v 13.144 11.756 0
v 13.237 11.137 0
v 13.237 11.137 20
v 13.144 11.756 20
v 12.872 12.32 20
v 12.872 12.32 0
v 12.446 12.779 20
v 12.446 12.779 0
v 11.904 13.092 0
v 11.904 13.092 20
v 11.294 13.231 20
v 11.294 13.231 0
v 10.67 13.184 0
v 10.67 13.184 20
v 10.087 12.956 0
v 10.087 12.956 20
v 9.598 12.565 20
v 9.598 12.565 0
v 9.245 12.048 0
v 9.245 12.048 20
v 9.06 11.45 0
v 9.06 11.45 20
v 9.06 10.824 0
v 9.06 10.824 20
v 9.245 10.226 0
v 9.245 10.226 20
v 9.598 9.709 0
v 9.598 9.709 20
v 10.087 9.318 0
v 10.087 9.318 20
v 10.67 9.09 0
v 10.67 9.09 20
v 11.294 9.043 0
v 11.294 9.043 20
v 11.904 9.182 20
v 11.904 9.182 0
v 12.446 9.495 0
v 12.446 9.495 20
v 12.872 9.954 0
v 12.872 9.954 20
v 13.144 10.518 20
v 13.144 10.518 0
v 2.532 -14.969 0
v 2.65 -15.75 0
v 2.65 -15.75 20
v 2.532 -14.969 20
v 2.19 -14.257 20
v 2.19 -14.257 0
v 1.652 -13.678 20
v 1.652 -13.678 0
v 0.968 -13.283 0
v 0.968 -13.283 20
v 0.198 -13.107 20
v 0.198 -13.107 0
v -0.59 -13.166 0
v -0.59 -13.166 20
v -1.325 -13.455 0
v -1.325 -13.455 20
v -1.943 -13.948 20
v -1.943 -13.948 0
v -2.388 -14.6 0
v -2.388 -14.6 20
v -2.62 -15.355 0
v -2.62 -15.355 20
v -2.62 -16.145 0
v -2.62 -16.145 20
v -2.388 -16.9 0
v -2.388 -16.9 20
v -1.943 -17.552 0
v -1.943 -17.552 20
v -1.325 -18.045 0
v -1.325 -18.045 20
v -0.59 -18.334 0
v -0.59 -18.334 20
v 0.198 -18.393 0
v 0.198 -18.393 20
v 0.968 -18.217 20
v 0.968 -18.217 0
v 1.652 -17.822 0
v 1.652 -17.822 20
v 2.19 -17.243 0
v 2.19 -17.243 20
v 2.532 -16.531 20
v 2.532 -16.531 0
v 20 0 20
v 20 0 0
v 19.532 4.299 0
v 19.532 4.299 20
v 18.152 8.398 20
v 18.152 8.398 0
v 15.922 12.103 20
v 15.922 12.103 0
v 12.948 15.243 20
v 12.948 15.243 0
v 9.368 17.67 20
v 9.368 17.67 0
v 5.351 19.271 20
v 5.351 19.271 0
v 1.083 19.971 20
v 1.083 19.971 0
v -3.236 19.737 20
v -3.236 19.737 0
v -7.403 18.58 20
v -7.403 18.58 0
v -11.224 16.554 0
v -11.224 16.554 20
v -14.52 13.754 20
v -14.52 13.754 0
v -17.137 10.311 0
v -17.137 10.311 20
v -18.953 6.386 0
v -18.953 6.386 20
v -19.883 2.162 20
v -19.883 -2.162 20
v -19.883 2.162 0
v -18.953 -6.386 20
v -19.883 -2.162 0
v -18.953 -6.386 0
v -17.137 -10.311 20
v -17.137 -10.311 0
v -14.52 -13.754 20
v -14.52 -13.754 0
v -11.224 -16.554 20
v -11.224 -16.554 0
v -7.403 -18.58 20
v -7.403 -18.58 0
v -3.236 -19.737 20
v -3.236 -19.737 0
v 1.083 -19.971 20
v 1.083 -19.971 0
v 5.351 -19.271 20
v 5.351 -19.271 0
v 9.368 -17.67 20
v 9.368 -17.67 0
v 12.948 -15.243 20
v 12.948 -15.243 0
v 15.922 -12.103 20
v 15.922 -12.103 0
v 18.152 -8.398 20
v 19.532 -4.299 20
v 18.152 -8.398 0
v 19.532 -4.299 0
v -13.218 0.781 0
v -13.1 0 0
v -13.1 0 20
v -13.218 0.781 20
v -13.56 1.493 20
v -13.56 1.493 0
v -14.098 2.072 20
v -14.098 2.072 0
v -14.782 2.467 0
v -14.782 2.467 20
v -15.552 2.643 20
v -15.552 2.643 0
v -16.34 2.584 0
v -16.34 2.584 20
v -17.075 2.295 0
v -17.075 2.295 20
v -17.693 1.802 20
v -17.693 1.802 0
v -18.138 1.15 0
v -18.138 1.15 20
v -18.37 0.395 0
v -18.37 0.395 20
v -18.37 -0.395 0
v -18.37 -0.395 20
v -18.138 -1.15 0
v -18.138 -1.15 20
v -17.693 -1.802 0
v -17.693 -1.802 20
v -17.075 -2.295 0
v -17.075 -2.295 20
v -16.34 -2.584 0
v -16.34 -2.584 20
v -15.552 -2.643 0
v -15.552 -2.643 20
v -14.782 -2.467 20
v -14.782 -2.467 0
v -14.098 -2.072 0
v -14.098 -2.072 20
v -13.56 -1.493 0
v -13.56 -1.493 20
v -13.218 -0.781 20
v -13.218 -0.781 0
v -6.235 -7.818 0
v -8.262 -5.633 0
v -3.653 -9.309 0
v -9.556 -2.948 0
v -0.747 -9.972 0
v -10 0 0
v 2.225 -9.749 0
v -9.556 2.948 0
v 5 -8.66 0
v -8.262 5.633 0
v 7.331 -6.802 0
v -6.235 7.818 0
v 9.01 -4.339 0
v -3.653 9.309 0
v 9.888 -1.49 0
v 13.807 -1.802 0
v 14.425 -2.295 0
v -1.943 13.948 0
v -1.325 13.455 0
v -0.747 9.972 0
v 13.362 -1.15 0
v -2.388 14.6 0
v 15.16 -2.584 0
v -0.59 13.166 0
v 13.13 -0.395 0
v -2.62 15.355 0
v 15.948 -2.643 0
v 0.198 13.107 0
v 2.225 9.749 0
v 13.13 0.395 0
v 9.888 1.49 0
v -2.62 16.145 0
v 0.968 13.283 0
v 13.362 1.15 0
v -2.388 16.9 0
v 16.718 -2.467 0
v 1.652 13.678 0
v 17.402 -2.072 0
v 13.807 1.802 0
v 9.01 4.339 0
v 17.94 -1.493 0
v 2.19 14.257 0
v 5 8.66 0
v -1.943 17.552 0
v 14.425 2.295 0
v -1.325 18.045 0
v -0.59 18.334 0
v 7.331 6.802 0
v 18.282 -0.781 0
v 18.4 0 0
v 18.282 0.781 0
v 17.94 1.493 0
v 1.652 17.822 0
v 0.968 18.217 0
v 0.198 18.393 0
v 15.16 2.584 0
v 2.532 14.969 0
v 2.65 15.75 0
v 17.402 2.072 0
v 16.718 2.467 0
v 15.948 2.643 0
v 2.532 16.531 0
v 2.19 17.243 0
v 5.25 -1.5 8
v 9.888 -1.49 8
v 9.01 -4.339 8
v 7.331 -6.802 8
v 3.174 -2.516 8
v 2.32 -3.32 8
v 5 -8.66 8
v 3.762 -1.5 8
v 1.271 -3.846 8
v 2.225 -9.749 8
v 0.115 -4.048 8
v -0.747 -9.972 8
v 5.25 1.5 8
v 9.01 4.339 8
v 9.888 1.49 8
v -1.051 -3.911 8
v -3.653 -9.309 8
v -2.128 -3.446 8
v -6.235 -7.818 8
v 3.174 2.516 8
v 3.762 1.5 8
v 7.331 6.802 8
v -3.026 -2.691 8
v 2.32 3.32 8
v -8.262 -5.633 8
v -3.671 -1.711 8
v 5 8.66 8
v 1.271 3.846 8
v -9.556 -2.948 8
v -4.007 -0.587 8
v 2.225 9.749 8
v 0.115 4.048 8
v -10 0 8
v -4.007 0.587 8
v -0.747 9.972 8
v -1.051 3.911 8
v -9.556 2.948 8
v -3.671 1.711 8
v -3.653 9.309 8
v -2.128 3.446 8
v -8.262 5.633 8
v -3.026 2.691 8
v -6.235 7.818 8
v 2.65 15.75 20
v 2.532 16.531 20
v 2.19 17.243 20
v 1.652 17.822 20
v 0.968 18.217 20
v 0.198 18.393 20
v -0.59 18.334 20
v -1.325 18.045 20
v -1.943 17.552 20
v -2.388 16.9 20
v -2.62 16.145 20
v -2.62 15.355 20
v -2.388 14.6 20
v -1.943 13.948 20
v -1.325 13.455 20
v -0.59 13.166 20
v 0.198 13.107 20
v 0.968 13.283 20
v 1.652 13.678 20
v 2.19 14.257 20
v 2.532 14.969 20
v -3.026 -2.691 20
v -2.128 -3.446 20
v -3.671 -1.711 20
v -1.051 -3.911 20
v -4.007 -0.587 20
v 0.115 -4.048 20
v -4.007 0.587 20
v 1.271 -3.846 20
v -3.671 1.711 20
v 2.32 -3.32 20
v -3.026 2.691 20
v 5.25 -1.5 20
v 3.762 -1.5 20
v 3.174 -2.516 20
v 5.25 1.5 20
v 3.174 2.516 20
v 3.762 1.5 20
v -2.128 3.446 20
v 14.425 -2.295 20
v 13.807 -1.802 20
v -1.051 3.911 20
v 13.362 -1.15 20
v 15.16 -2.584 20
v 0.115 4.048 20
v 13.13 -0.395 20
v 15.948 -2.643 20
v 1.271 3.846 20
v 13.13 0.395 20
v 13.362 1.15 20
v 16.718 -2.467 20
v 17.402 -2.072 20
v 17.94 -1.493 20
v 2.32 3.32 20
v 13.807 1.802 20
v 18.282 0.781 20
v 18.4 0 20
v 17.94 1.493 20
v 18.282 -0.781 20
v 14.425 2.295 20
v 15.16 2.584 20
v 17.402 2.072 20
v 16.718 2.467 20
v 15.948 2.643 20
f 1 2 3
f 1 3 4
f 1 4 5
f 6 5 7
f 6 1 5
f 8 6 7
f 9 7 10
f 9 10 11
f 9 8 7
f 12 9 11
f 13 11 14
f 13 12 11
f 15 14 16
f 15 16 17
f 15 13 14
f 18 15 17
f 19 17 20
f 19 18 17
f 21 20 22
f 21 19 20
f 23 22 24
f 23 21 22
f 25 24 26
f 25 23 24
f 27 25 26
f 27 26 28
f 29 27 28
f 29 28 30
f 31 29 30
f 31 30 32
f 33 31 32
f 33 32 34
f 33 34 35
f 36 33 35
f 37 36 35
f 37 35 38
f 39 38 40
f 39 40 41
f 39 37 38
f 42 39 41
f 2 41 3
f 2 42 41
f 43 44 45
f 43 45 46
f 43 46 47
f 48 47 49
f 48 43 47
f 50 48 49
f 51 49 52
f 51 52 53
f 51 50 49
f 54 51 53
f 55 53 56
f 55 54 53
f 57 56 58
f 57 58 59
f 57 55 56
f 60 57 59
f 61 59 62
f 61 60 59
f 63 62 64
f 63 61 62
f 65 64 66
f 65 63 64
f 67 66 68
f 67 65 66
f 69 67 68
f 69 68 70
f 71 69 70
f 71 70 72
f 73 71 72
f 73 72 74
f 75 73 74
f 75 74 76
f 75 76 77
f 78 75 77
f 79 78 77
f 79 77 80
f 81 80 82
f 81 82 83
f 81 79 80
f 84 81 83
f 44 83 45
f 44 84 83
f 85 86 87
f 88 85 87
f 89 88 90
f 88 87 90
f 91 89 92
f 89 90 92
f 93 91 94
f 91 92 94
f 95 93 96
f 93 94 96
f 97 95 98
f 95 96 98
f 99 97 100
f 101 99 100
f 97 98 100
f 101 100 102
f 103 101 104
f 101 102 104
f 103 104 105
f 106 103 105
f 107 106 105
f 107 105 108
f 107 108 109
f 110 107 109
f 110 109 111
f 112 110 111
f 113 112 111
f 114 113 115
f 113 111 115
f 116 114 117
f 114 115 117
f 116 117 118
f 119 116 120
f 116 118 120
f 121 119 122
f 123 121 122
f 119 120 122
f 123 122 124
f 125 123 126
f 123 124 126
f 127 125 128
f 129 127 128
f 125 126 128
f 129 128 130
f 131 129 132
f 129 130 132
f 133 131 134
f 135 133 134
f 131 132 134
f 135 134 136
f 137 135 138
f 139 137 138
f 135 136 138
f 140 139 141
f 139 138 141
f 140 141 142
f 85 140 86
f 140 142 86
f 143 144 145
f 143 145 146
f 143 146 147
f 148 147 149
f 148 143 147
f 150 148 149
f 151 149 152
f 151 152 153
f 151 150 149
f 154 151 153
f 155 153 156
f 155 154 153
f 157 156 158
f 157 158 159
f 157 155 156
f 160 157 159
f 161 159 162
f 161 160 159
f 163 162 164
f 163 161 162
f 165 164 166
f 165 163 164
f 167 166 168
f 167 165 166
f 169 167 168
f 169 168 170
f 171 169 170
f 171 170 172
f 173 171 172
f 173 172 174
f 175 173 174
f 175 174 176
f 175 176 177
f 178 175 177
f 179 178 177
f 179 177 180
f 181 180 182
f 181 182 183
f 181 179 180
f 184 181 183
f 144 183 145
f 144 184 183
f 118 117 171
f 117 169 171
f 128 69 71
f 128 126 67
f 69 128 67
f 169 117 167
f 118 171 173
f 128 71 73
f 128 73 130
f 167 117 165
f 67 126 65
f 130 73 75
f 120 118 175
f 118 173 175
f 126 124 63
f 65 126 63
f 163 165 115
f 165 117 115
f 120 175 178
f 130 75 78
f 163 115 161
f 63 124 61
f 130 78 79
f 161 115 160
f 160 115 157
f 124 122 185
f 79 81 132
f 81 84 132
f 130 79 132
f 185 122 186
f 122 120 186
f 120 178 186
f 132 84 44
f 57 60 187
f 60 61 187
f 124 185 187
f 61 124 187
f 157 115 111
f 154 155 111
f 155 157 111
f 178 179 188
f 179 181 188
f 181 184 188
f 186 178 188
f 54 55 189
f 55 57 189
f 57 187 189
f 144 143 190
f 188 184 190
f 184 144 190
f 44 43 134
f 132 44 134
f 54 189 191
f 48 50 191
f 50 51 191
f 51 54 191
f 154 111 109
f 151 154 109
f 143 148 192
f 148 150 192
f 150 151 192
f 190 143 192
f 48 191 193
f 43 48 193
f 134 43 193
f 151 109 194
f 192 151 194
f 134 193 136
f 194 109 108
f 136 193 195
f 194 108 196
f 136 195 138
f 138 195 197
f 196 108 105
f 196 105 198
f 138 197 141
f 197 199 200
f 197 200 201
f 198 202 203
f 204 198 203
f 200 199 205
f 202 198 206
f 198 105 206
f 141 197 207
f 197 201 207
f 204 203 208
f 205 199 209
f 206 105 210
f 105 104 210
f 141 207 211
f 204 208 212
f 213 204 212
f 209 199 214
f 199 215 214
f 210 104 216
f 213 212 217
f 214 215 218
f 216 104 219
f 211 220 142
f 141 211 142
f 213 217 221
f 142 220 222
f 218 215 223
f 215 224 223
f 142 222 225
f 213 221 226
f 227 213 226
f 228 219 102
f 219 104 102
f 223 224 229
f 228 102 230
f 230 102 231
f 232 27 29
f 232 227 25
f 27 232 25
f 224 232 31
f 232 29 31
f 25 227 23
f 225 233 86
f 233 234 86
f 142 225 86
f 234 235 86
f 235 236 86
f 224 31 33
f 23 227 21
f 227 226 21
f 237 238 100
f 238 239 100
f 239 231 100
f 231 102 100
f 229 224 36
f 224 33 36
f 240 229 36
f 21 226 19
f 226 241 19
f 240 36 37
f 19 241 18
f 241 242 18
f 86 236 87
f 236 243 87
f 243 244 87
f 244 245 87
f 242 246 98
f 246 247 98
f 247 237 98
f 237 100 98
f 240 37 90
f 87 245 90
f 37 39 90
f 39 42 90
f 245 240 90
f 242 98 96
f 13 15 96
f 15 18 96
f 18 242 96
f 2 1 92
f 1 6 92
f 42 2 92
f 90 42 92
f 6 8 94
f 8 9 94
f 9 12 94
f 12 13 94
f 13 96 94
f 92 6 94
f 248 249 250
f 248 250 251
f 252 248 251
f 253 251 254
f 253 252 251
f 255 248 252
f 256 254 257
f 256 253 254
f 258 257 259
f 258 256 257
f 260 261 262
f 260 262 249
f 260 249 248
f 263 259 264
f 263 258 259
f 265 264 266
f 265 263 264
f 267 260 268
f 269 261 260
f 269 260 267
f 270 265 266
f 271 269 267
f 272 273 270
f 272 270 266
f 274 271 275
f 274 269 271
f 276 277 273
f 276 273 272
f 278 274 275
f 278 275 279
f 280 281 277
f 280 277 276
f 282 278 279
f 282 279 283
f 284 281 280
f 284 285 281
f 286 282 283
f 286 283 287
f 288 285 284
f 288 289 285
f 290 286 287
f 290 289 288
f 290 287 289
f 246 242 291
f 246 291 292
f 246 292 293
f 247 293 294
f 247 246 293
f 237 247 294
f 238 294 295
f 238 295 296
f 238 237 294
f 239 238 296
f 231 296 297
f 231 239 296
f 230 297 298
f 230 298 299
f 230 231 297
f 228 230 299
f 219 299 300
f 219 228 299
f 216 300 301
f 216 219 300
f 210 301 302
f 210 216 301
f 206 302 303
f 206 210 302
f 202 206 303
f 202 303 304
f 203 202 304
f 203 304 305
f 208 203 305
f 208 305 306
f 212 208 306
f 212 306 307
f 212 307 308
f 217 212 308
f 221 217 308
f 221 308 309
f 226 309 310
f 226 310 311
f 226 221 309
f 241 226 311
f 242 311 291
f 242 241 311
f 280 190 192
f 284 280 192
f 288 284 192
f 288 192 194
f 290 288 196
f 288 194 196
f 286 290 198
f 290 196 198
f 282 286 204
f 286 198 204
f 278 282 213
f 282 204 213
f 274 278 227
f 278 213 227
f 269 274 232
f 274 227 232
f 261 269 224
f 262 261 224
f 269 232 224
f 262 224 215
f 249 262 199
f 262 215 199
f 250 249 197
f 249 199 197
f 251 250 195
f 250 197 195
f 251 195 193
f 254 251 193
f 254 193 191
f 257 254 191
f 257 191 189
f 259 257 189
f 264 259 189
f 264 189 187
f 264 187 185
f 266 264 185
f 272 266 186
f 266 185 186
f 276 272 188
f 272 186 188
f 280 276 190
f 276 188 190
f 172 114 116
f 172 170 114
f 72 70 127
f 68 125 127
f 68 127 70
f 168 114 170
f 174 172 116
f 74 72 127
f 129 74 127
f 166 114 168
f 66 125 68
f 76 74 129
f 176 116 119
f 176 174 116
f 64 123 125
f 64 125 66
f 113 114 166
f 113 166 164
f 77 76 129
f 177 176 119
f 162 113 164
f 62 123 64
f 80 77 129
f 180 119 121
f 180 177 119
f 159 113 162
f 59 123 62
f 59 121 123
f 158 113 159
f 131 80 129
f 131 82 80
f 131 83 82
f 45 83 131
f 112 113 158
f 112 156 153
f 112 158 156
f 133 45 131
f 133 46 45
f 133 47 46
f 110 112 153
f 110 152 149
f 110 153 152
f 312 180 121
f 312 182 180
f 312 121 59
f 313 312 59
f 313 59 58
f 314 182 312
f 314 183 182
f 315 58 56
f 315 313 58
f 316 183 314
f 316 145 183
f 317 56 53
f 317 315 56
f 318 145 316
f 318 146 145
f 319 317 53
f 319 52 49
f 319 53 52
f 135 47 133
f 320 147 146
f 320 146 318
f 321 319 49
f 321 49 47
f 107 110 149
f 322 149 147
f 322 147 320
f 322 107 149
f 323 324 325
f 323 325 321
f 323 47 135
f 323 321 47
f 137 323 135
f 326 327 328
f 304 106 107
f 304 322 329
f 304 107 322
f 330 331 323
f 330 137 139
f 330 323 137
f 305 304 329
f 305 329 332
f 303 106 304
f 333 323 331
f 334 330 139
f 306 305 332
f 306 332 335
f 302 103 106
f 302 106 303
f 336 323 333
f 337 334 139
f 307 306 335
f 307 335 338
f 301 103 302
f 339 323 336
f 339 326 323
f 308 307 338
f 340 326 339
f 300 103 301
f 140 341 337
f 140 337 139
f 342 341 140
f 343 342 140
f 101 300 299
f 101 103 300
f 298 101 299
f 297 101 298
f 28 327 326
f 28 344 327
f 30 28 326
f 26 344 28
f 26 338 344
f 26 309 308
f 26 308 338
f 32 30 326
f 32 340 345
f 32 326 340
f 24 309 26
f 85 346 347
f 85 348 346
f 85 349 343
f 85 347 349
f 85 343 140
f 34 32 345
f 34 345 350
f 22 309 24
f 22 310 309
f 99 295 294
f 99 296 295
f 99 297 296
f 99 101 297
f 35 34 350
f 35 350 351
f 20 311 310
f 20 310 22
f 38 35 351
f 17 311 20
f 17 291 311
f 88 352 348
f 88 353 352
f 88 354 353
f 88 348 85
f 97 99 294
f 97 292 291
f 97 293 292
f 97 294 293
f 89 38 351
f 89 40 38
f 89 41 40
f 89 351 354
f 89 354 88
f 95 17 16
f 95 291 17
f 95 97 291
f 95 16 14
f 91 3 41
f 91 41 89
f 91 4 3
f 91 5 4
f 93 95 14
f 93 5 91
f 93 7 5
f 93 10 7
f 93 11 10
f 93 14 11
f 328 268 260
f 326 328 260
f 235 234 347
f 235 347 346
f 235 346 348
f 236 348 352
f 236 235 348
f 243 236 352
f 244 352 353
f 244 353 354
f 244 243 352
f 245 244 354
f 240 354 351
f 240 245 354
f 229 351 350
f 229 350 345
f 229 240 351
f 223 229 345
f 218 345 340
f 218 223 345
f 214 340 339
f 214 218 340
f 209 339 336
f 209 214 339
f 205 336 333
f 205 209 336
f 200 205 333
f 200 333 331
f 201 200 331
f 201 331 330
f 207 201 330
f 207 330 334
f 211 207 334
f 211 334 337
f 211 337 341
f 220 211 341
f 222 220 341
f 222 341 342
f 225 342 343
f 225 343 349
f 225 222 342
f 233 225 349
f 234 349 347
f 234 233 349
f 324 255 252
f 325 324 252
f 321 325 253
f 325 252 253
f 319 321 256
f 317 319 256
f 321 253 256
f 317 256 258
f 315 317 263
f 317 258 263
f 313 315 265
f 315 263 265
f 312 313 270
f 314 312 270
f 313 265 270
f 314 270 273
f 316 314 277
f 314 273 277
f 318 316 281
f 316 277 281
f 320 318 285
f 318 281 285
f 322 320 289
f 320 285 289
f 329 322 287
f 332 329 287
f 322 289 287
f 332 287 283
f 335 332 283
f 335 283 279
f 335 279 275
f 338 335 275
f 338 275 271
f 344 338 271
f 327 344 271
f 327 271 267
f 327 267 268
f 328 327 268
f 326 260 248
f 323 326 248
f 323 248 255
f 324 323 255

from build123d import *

# Parameters (mm, degrees)
SKETCH1_R                       = 20
SKETCH1_R_2                     = 2.1
SKETCH1_R_3                     = 2.65
SKETCH1_R_4                     = 10
BOSS_EXTRUDE1_DEPTH             = 20
SKIZZE1_R                       = 10
SCHNITT_LINEAR_AUSTRAGEN1_DEPTH = 8


with BuildPart() as part:
    # Sketch1 → Boss-Extrude1 (new body)
    # profile 1 of 2: a face of its own
    with BuildSketch(Plane.XY):
        Circle(SKETCH1_R)
        with Locations((11.136931804, 11.136931804)):
            Circle(SKETCH1_R_2, mode=Mode.SUBTRACT)
        with Locations((-15.75, 0)):
            Circle(SKETCH1_R_3, mode=Mode.SUBTRACT)
        with Locations((0, -15.75)):
            Circle(SKETCH1_R_3, mode=Mode.SUBTRACT)
        with Locations((15.75, 0)):
            Circle(SKETCH1_R_3, mode=Mode.SUBTRACT)
        with Locations((0, 15.75)):
            Circle(SKETCH1_R_3, mode=Mode.SUBTRACT)
        Circle(SKETCH1_R_4, mode=Mode.SUBTRACT)
    # profile 2 of 2: a face of its own
    with BuildSketch(Plane.XY):
        Circle(SKETCH1_R_4)
        with BuildLine():
            Line((5.25, -1.5), (3.761980861, -1.5))
            ThreePointArc((3.761980861, -1.5), (-4.05, 0), (3.761980861, 1.5))
            Line((3.761980861, 1.5), (5.25, 1.5))
            Line((5.25, 1.5), (5.25, -1.5))
        make_face(mode=Mode.SUBTRACT)
    extrude(amount=BOSS_EXTRUDE1_DEPTH)

    # Skizze1 → Schnitt-Linear austragen1 (cut)
    with BuildSketch(Plane(origin=(0, 0, 0), x_dir=(-1, 0, 0), z_dir=(0, 0, -1))):
        Circle(SKIZZE1_R)
    extrude(amount=-SCHNITT_LINEAR_AUSTRAGEN1_DEPTH, mode=Mode.SUBTRACT)


solid = part.part
